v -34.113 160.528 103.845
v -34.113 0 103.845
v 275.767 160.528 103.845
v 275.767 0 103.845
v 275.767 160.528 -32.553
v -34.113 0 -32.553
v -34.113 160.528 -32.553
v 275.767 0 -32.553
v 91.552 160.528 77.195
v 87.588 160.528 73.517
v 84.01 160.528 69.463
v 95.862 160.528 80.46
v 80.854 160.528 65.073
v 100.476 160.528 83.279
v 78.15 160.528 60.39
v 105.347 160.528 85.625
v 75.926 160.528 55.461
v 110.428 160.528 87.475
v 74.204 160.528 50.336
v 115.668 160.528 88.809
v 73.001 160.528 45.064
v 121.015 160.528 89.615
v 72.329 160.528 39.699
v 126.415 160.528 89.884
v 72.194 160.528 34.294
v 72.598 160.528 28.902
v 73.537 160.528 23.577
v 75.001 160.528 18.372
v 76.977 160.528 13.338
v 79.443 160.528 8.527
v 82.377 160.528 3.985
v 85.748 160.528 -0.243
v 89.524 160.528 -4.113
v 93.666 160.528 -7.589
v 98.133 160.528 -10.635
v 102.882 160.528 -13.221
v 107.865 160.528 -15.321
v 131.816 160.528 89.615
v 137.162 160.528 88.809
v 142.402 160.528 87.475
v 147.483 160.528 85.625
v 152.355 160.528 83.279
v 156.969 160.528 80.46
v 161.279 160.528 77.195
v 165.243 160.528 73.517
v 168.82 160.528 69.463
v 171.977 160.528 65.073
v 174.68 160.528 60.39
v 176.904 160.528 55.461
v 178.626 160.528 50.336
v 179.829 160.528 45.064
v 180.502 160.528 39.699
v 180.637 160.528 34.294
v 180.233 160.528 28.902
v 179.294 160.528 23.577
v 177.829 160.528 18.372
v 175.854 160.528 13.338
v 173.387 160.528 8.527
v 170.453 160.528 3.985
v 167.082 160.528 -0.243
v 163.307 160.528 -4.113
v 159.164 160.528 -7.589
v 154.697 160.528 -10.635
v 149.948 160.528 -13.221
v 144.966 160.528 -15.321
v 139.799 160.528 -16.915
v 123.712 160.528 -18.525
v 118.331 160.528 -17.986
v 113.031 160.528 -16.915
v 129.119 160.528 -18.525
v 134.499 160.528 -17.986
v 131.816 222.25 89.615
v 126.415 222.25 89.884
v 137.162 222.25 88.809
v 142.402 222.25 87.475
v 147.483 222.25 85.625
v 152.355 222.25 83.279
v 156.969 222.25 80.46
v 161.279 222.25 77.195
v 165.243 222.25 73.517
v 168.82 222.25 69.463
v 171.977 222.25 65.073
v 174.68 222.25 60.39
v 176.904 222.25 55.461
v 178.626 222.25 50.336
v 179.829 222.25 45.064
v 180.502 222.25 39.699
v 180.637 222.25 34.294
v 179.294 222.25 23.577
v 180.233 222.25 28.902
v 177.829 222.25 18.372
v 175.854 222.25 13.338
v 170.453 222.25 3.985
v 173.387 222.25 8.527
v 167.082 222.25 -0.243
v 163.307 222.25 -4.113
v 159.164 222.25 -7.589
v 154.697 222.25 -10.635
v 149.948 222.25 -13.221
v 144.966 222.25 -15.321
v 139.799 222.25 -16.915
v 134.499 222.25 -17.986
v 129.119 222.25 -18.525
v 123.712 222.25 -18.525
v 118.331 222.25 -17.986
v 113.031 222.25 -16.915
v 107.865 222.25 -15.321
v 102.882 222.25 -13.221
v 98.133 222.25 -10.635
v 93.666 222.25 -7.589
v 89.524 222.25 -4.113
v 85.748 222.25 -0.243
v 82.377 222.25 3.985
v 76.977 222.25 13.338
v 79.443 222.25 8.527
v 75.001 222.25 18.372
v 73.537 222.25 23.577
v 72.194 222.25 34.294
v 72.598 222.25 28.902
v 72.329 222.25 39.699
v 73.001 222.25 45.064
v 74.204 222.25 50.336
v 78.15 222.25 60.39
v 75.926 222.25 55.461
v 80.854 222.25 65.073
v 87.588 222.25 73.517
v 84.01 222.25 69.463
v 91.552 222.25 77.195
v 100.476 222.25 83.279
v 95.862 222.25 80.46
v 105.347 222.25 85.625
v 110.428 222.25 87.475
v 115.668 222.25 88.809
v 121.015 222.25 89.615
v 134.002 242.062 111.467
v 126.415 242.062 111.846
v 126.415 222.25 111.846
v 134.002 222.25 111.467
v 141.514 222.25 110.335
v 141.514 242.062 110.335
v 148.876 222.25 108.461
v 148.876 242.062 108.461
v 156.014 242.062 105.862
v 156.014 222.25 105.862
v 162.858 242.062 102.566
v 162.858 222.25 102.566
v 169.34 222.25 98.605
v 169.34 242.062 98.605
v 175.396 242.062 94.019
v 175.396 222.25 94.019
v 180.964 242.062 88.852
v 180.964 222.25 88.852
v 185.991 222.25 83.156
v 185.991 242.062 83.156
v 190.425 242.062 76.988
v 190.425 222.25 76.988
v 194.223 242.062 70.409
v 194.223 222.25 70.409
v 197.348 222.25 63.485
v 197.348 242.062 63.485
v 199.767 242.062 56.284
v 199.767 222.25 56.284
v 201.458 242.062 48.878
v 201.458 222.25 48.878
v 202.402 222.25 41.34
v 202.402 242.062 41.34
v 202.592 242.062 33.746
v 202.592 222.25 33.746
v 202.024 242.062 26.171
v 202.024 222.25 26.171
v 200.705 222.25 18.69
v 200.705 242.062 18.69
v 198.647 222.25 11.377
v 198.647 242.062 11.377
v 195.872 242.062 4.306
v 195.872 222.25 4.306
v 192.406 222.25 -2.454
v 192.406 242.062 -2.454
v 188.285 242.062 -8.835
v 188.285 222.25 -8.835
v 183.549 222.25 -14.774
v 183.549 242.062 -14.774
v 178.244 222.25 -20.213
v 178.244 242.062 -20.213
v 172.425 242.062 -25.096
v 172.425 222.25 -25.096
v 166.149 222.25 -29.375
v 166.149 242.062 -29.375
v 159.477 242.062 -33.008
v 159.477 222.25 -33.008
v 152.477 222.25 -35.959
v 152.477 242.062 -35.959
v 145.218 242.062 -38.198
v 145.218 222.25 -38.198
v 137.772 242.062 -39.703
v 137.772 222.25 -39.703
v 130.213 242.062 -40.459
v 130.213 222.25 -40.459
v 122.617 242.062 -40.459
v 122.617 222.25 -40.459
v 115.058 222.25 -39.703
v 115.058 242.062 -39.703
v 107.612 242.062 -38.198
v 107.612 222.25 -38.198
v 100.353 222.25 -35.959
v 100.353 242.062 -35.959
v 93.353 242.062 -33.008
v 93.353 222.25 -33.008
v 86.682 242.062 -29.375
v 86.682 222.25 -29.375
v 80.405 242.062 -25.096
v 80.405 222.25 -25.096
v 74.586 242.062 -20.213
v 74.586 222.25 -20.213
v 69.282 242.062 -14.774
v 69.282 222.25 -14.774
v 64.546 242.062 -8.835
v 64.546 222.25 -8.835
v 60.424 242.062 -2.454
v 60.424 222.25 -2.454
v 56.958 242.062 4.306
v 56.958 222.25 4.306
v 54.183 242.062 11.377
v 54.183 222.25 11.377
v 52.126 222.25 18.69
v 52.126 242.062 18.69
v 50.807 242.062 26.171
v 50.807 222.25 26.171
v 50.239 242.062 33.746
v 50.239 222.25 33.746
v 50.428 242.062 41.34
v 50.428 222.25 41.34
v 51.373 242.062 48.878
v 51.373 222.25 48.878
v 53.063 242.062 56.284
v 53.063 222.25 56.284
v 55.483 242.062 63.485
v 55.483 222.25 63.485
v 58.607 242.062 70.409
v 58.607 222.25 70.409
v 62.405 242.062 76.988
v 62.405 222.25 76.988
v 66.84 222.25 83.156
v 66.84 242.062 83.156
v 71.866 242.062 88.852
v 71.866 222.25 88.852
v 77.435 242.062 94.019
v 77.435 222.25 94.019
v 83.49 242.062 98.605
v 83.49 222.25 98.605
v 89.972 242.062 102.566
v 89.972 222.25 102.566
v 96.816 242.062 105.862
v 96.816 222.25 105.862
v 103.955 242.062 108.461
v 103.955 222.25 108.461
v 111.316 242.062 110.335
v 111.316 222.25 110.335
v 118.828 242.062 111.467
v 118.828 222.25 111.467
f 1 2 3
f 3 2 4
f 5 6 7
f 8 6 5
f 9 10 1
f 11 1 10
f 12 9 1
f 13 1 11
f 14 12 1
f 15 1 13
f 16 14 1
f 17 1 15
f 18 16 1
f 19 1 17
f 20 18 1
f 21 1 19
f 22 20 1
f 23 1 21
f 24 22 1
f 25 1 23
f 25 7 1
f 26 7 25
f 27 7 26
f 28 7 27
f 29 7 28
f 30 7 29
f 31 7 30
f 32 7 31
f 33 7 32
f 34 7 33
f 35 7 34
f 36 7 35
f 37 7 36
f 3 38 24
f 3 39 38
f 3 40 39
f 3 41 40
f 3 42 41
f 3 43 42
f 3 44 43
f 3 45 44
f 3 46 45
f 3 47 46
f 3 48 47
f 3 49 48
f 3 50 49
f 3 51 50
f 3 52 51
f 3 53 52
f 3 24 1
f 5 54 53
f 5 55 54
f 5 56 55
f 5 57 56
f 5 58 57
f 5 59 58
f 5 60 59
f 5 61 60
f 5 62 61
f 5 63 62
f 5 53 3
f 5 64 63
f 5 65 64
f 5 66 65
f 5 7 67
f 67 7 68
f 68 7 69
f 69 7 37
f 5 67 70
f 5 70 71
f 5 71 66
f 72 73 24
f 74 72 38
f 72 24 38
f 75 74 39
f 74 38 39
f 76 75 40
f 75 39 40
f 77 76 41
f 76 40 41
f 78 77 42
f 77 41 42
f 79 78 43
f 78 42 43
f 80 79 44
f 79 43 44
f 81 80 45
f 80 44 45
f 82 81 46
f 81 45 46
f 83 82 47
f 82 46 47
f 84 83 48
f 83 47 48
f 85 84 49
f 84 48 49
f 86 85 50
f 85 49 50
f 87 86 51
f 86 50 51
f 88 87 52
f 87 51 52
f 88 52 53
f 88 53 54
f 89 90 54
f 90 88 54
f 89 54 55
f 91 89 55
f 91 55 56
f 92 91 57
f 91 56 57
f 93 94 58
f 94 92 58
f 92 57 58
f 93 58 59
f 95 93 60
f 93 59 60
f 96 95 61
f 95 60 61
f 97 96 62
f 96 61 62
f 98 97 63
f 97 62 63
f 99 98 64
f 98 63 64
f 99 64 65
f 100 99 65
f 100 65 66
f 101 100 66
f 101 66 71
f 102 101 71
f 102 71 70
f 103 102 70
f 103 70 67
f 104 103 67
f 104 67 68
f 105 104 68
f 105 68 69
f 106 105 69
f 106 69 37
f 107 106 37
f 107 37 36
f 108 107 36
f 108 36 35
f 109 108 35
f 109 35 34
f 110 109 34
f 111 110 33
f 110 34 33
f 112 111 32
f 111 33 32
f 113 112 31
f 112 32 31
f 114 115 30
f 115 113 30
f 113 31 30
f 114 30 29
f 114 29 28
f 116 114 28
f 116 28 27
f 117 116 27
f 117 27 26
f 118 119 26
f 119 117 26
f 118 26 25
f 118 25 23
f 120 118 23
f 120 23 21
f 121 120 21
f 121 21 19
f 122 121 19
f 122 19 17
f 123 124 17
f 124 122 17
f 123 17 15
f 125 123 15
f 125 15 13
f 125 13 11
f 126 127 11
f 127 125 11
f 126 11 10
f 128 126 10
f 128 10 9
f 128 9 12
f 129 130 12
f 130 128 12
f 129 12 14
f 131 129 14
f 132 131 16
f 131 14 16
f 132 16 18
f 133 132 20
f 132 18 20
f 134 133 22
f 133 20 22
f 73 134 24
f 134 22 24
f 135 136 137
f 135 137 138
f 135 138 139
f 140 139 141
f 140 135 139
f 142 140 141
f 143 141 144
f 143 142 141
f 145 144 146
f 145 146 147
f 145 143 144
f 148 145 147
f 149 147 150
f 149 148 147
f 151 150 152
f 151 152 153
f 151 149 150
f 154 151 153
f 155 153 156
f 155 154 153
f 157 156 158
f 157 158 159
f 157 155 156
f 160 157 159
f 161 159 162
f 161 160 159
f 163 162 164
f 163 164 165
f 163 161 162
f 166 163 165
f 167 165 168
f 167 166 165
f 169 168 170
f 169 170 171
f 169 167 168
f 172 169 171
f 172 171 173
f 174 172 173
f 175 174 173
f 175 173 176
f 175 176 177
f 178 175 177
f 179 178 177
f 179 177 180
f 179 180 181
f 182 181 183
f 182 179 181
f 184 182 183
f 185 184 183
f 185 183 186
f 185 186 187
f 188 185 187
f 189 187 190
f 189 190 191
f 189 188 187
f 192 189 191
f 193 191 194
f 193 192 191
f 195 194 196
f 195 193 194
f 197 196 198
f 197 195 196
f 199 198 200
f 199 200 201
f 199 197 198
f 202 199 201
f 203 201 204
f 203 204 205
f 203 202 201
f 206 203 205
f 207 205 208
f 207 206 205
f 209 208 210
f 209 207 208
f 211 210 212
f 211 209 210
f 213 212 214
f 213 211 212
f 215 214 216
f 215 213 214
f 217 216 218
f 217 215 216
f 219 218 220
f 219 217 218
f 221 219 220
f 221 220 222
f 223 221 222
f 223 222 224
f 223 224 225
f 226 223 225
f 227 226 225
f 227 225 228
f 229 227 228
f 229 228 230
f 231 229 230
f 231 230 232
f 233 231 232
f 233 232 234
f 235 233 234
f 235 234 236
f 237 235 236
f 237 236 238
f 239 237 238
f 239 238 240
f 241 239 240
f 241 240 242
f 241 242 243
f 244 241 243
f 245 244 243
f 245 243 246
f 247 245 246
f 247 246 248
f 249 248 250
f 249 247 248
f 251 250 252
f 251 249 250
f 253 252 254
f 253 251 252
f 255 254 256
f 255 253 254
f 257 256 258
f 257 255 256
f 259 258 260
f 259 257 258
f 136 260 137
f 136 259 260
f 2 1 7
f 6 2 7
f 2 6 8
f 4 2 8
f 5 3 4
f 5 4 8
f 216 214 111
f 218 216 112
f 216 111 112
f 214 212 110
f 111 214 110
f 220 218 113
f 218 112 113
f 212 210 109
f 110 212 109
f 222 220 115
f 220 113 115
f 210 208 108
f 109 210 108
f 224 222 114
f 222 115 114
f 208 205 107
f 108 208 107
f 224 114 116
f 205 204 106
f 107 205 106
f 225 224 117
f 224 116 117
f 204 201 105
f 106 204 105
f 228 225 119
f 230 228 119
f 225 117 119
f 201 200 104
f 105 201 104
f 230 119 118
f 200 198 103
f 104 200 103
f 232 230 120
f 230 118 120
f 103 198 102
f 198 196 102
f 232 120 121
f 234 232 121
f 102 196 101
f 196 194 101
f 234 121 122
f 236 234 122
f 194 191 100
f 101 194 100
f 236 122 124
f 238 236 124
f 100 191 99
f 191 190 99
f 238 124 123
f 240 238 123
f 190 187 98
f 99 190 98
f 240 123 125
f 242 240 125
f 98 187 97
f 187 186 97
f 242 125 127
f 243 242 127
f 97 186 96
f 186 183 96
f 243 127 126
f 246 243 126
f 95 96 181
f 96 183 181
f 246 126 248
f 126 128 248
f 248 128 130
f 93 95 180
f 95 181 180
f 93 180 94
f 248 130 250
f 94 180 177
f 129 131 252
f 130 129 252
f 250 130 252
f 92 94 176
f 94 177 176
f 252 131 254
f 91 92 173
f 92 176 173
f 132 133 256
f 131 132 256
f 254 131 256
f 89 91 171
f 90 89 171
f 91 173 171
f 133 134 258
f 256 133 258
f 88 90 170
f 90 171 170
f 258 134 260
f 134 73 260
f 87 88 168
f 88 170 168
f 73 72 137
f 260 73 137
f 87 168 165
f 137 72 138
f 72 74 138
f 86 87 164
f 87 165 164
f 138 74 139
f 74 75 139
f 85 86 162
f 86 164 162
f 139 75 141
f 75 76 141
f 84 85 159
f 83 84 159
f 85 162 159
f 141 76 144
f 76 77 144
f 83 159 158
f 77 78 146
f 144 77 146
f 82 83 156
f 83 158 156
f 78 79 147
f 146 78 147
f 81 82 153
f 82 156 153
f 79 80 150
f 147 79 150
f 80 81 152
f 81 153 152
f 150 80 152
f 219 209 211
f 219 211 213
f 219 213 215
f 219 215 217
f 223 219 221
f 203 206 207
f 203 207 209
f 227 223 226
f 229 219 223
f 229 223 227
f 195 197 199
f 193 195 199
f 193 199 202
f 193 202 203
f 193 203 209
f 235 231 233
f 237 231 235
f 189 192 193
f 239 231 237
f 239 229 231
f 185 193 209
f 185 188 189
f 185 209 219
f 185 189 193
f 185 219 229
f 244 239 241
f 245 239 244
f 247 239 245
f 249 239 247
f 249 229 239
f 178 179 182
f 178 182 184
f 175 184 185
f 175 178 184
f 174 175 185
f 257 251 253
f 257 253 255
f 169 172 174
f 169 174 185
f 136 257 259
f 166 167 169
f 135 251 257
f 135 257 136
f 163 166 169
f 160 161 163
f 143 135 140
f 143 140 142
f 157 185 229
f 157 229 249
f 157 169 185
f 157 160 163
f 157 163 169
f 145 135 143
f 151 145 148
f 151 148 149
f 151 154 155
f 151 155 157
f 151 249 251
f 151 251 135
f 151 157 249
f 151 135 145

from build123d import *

# Parameters (mm, degrees)
SKETCH1_W      = 309.88
SKETCH1_H      = 136.398
EXTRUDE1_DEPTH = 160.528
SKETCH2_R      = 54.23826071
EXTRUDE2_DEPTH = 81.534
SKETCH3_R      = 76.2
EXTRUDE3_DEPTH = 19.812


with BuildPart() as part:
    # Sketch1 → Extrude1 (new body)
    with BuildSketch(Plane(origin=(0, 0, 0), x_dir=(1, 0, 0), z_dir=(0, 1, 0))):
        with Locations((120.827186097, -35.645984436)):
            Rectangle(SKETCH1_W, SKETCH1_H)
    extrude(amount=EXTRUDE1_DEPTH)

    # Sketch2 → Extrude2 (add)
    with BuildSketch(Plane(origin=(0, 160.528, 0), x_dir=(1, 0, 0), z_dir=(0, 1, 0))):
        with Locations(Location((126.415186097, -35.645984436, 0), (0, 0, 270))):
            Circle(SKETCH2_R)
    extrude(amount=EXTRUDE2_DEPTH)

    # Sketch3 → Extrude3 (add)
    with BuildSketch(Plane(origin=(0, 242.062, 0), x_dir=(1, 0, 0), z_dir=(0, 1, 0))):
        with Locations(Location((126.415186097, -35.645984436, 0), (0, 0, 270))):
            Circle(SKETCH3_R)
    extrude(amount=-EXTRUDE3_DEPTH)


solid = part.part
